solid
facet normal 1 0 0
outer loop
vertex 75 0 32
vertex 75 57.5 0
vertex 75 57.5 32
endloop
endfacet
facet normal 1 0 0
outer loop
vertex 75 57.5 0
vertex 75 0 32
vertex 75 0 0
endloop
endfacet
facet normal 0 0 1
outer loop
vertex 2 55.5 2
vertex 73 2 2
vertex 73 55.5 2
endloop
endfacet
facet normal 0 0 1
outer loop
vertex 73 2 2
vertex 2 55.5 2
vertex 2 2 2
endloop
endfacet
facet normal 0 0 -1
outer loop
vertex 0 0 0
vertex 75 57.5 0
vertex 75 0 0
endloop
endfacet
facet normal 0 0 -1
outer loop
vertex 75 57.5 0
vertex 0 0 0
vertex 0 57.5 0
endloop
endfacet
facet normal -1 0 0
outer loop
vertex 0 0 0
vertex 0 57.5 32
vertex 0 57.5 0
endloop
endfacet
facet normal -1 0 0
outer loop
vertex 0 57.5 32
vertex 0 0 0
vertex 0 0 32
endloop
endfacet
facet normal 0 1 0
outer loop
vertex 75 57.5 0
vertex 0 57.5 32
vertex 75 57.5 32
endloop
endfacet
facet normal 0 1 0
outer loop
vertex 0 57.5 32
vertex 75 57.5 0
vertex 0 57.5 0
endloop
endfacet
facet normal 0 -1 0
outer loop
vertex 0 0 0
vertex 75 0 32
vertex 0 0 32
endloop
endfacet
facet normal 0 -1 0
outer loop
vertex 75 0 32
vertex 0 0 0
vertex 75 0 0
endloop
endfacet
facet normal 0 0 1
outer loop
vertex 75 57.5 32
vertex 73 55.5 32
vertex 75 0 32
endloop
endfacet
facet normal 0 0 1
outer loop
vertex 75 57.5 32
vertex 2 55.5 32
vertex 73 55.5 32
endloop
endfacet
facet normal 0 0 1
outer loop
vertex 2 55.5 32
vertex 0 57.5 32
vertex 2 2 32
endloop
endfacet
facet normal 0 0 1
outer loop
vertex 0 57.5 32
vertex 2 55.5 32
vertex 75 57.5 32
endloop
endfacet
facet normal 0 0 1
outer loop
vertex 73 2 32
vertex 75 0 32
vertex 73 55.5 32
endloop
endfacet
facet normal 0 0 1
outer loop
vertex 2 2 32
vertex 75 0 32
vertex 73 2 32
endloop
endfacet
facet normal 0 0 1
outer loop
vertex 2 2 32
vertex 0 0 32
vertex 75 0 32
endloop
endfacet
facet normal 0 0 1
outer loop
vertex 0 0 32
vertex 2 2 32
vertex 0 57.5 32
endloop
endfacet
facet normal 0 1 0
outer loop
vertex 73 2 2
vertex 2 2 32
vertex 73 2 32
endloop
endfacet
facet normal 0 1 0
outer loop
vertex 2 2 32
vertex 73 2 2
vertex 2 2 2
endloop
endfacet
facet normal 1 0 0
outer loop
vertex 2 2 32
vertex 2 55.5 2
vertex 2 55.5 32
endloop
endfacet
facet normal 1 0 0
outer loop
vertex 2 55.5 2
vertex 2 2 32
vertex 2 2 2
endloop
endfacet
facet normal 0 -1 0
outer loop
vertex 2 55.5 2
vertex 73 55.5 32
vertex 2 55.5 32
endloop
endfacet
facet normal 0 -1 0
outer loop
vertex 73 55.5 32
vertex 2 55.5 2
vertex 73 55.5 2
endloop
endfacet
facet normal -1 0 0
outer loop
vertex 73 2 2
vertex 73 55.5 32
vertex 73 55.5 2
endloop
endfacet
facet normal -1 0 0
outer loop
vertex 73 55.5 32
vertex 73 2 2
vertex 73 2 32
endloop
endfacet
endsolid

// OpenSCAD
// file: stackable_box.scad
use <card_holder.scad>
use <olivers_shapes.scad>
$fa = 1;
$fs = 0.4;
module base(length=60,width=40,thickness=2,max_angle=30) {
    w = thickness*tan(max_angle);
    polyhedron(
        points=[ 
            [0,0,0],
            [width,0,0],
            [width,length,0],
            [0,length,0],
            [w,w,-thickness],
            [width-w,w,-thickness],
            [width-w,length-w,-thickness],
            [w,length-w,-thickness]
        ],
        faces = [
            [0,3,2,1],
            [0,1,5,4],
            [1,2,6,5],
            [2,3,7,6],
            [3,0,4,7],
            [4,5,6,7]
        ]
    );
};
module stackable_box_lid(length=60,width=40,thickness=2,tolerance=0.5, max_angle=30) {
    d=0.001;
    //base
    translate([0,0,0]) union () {
        cube([width,length,thickness]);
        base(length,width,thickness,max_angle);
    };
};
module stackable_box(length=60,width=40,height=30,thickness=2,tolerance=0.5,bottom=false,top=false, max_angle=30) {
    full_height = bottom ? height : height - thickness;
    difference() {
        union() {
            if (!bottom) { base(length=length,width=width,thickness=thickness,max_angle=max_angle); }
            else {cube([width,length,thickness]);}
            cube([width,thickness,full_height]);
            cube([thickness,length,full_height]);
            translate([0,length-thickness,0]) cube([width,thickness,full_height]);
            translate([width-thickness,0,0]) cube([thickness,length,full_height]);
        };
        if(!top) {translate([0,0,full_height]) base(length=length,width=width,thickness=thickness,max_angle=max_angle);};
    };
};
module stackable_circle_holder(width=40,length=60,height=30,d=30,thickness=2,top=false) {
    union () {
        stackable_box(width=width, length=length, height=height,top=top);
        difference() {
            union() {
                cube([width,length,d/2]);
                triangle_height=height-d/2-2*thickness;
                triangle_width=(length-d-2*thickness)/2;
                translate([0,thickness,d/2]) linear_extrude(height=triangle_height,scale=[1,0])  square(size=[width,triangle_width]);
                rotate([0,0,180]) translate([-width,-length+thickness,d/2]) linear_extrude(height=triangle_height,scale=[1,0])  square(size=[width,triangle_width]);
            };
            translate([thickness + 0.001,length/2,d/2]) rotate([0,90,0]) cylinder(h=width-2*thickness-0.002,d=d);
        };
    };
};
// file: olivers_shapes.scad
module rounded_square(length=20, width=20,d=5) {
    union () {
        translate([0,d/2,0]) square([width,length-d]);
        translate([d/2,0,0]) square([width-d,length]);
        translate([d/2,d/2,0]) circle(d=d);
        translate([width-d/2,d/2,0]) circle(d=d);
        translate([width-d/2,length-d/2,0]) circle(d=d);
        translate([d/2,length-d/2,0]) circle(d=d);
    };
};
// file: card_holder.scad
use <stackable_box.scad>
$fa = 1;
$fs = 0.4;
module slot(width,depth,height,thickness,rounded_slot=true) {
    difference() {
        union () {
            translate([-width/2,-0.001,thickness]) cube([width,thickness+0.002,height]);
            translate([0,depth-width/2,-thickness-0.001]) cylinder(d=width,h=2*thickness+0.003);
            translate([-width/2,-0.001,-thickness-0.001]) cube([width,depth-width/2,2*thickness+0.003]);
            //Cutout in preparation for rounded edges
            if (rounded_slot) {translate([-width,-0.001,height-width/2+0.001]) cube([width*2,thickness+0.002,width/2+0.002]);}
        };
        //Rounded edges of slot
        if (rounded_slot) {
            translate([-width,thickness+0.003,height-width/2]) rotate([90,0,0]) cylinder(d=width,h=thickness+0.004);
            translate([width,thickness+0.003,height-width/2]) rotate([90,0,0]) cylinder(d=width,h=thickness+0.004);
        }
    };
};
module card_holder(card_width=64,card_height=89,thickness=2,height=40,slot_width=20,slot_depth=20,tolerance=0.5,slots=[1,0,0,0],rounded_slot=true,stackable=false,max_angle=30) {
    card_height=card_height+2*tolerance;
    card_width=card_width+2*tolerance;
    base_height=2*thickness+card_height;
    base_width=2*thickness+card_width;
    full_height = stackable ? height - thickness : height;
    union() {
        difference() {
            union() {
                //base
                
                if (stackable) { base(length=base_width,width=base_height,thickness=thickness,max_angle=max_angle); }
                else {cube([base_height,base_width,thickness]);}
                //width walls
                cube([thickness,base_width,full_height]);
                translate([base_height-thickness,0,0]) cube([thickness,base_width,full_height]);
                //height walls
                cube([base_height,thickness,full_height]);
                translate([0,base_width-thickness,0]) cube([base_height,thickness,full_height]);
            };
            if(slots[0] == 1) {
                translate([base_height/2,0,0]) slot(width=slot_width,depth=slot_depth,height=full_height,thickness=thickness,rounded_slot=rounded_slot);
            };
            if(slots[1] == 1) {
                translate([0,base_width/2,0]) rotate([0,0,270]) slot(width=slot_width,depth=slot_depth,height=full_height,thickness=thickness,rounded_slot=rounded_slot);
            };
            if(slots[2] == 1) {
                translate([base_height/2,base_width,0]) rotate([0,0,180]) slot(width=slot_width,depth=slot_depth,height=full_height,thickness=thickness,rounded_slot=rounded_slot);
            };
            if(slots[3] == 1) {
                translate([base_height,base_width/2,0]) rotate([0,0,90]) slot(width=slot_width,depth=slot_depth,height=full_height,thickness=thickness,rounded_slot=rounded_slot);
            }
            if(stackable) {translate([0,0,full_height]) base(length=base_width,width=base_height,thickness=thickness,max_angle=max_angle);}
        };
    };
};
card_holder(height=20,stackable=true);
//slot(width=20,deph=20,thickness=2,height=30);
// main file
use <card_holder.scad>
use <olivers_shapes.scad>
use <stackable_box.scad>

// Critter pieces box (x10)
//stackable_box(width=58, length=67.5, height=17);

//translate([-65,0,0]) stackable_box(width=58, length=67.5, height=17);
//translate([-65,0,15]) color("blue") stackable_box(width=58, length=67.5, height=17);

// Small card holders
// Forest location cards and special event card (x2)
//card_holder(card_width=46, card_height=65, height=32, stackable=true);
// Awards (x1)
//card_holder(card_width=46, card_height=65, height=19, stackable=true);
// Pearl Cards (x1)
//card_holder(card_width=46, card_height=65, height=15, stackable=true);
// Creature ability cards (x1)
//card_holder(card_width=46, card_height=65, height=16, stackable=true);

// Hobbit hole door thing holder (x1)
//stackable_circle_holder(width=70, length=23.5, height=17, d=14);
// Axolotol token holder
//stackable_box(width=70, length=27, height=17);

//revised above
// Hobbit hole door thing holder (x1)
//stackable_circle_holder(width=70, length=19, height=17, d=14,top=true);
// Axolotol token holder ->  marketplace token holder
//stackable_box(width=70, length=31.6, height=17,top=true);

// Holders for critter & construction cards (x2)*
//card_holder(card_width=68,card_height=94,height=32);
// and remainder
//card_holder(card_width=68,card_height=94,height=24,stackable=true);

// Holder for river destination cards
//card_holder(card_width=68,card_height=94,height=10,stackable=true);

//misc_box
//stackable_box(top=true,width=99,height=32,length=73);

//axolotl tokens?*
//stackable_box(top=true,width=15,thickness=1.5,length=39);

// VP holder
/*union () {
    stackable_box(width=55,length=63,height=32);
    difference () {
        union () {
            stackable_circle_holder(width=55, length=35, height=32, d=25);
            translate([0,33,0]) stackable_circle_holder(width=55, length=30, height=32, d=20);
        };
        translate([-1,25,0]) cube([80,20,35]);
    };
    difference() {
        union () {
            stackable_circle_holder(width=55, length=35, height=16.5, d=25,top=true);
            translate([0,33,0]) stackable_circle_holder(width=55, length=30, height=16.5, d=20,top=true);
        };
        translate([2.001,25,12.499]) cube([50.998,20,30]);
    };
};/**/
/*difference () {
    union () {
        translate([0,0,5]) stackable_circle_holder(width=73, length=35, height=25, d=25);
        stackable_box(width=73, length=35, height=32);
        cube([73,35,5]);
    };
    translate([2.001,35/2,11]) rotate([0,90,0]) cylinder(h=73-4.002,d=20);
};*/

//stackable_box(width=27.5,length=35,height=32,thickness=1.2,top=true,bottom=true);
//stackable_box(width=30,length=20,height=32,thickness=1.2,top=true,bottom=true);
//stackable_box(width=75,length=30,height=32,thickness=2,top=true,bottom=true);
stackable_box(width=75,length=57.5,height=32,thickness=2,top=true,bottom=true);


/*/box
difference() {
    translate([-2,-2,-2]) cube([288,289,72]);
    translate([-0.001,-0.001,-0.001]) cube([284.002,285.002,72]);
};

// Critter pieces box (x12)
for (y=[14.5:67.54:220]) {
    translate([226,y,0]) color("green") stackable_box(width=58, length=67.5, height=17);
    translate([226,y,15.2]) color("green") stackable_box(width=58, length=67.5, height=17);
};
for (x=[109.5:58.4:200]) {
    translate([x,217.12,0]) color("green") stackable_box(width=58, length=67.5, height=17);
    translate([x,217.12,15.2]) color("green") stackable_box(width=58, length=67.5, height=17);
}

// Small card holders
// Forest location cards and special event card (x2)
translate([51.6,0,2.002]) rotate([0,0,90]) color("green") card_holder(card_width=46, card_height=65, height=32, stackable=true);
translate([51.6,214.6,2.002]) rotate([0,0,90]) color("green") card_holder(card_width=46, card_height=65, height=32, stackable=true);
// Awards (x1)
translate([51.6,71.5,2.002]) rotate([0,0,90]) color("green") card_holder(card_width=46, card_height=65, height=19, stackable=true);
// Pearl Cards (x1)
translate([51.6,71.5,19.202]) rotate([0,0,90]) color("green") card_holder(card_width=46, card_height=65, height=15, stackable=true);
// Creature ability cards (x1)
translate([51.6,143,2.002]) rotate([0,0,90]) color("green") card_holder(card_width=46, card_height=65, height=17, stackable=true);

// Hobbit hole door thing holder (x1)
translate([51.6,143,17.202]) rotate([0,0,90]) color("green") stackable_circle_holder(width=70, length=19, height=17, d=14);
// market token holder
translate([32.2,143,17.202]) rotate([0,0,90]) color("green") stackable_box(width=70, length=31.6, height=17);

// Holder for river destination cards
translate([225,72.4,0.002]) rotate([0,0,180]) color("green") card_holder(card_width=68,card_height=94,height=10,stackable=true);
// Holders for critter & construction cards (x2)*
translate([225,145.6,0]) rotate([0,0,180]) color("green") card_holder(card_width=68,card_height=94,height=32);
translate([225,217,0]) rotate([0,0,180]) color("green") card_holder(card_width=68,card_height=94,height=32);
// and remainder
translate([225,72.4,8.202]) rotate([0,0,180]) color("green") card_holder(card_width=68,card_height=94,height=24,stackable=true);

//axolotl tokens?*
translate([265,0,2.002]) rotate([0,0,90]) color("green") stackable_box(top=true,width=15,thickness=1.5,length=39);

//misc_box
translate([125.5,0,0]) color("green") rotate([0,0,90]) stackable_box(top=true,width=99,height=32,length=73);

//VP holder
translate([53,220,0]) color("green") union () {
    stackable_box(width=55,length=63,height=32);
    difference () {
        union () {
            stackable_circle_holder(width=55, length=35, height=32, d=25);
            translate([0,33,0]) stackable_circle_holder(width=55, length=30, height=32, d=20);
        };
        translate([-1,25,0]) cube([80,20,35]);
    };
    difference() {
        union () {
            stackable_circle_holder(width=55, length=35, height=16.5, d=25,top=true);
            translate([0,33,0]) stackable_circle_holder(width=55, length=30, height=16.5, d=20,top=true);
        };
        translate([2.001,25,12.499]) cube([50.998,20,30]);
    };
};

/**/
